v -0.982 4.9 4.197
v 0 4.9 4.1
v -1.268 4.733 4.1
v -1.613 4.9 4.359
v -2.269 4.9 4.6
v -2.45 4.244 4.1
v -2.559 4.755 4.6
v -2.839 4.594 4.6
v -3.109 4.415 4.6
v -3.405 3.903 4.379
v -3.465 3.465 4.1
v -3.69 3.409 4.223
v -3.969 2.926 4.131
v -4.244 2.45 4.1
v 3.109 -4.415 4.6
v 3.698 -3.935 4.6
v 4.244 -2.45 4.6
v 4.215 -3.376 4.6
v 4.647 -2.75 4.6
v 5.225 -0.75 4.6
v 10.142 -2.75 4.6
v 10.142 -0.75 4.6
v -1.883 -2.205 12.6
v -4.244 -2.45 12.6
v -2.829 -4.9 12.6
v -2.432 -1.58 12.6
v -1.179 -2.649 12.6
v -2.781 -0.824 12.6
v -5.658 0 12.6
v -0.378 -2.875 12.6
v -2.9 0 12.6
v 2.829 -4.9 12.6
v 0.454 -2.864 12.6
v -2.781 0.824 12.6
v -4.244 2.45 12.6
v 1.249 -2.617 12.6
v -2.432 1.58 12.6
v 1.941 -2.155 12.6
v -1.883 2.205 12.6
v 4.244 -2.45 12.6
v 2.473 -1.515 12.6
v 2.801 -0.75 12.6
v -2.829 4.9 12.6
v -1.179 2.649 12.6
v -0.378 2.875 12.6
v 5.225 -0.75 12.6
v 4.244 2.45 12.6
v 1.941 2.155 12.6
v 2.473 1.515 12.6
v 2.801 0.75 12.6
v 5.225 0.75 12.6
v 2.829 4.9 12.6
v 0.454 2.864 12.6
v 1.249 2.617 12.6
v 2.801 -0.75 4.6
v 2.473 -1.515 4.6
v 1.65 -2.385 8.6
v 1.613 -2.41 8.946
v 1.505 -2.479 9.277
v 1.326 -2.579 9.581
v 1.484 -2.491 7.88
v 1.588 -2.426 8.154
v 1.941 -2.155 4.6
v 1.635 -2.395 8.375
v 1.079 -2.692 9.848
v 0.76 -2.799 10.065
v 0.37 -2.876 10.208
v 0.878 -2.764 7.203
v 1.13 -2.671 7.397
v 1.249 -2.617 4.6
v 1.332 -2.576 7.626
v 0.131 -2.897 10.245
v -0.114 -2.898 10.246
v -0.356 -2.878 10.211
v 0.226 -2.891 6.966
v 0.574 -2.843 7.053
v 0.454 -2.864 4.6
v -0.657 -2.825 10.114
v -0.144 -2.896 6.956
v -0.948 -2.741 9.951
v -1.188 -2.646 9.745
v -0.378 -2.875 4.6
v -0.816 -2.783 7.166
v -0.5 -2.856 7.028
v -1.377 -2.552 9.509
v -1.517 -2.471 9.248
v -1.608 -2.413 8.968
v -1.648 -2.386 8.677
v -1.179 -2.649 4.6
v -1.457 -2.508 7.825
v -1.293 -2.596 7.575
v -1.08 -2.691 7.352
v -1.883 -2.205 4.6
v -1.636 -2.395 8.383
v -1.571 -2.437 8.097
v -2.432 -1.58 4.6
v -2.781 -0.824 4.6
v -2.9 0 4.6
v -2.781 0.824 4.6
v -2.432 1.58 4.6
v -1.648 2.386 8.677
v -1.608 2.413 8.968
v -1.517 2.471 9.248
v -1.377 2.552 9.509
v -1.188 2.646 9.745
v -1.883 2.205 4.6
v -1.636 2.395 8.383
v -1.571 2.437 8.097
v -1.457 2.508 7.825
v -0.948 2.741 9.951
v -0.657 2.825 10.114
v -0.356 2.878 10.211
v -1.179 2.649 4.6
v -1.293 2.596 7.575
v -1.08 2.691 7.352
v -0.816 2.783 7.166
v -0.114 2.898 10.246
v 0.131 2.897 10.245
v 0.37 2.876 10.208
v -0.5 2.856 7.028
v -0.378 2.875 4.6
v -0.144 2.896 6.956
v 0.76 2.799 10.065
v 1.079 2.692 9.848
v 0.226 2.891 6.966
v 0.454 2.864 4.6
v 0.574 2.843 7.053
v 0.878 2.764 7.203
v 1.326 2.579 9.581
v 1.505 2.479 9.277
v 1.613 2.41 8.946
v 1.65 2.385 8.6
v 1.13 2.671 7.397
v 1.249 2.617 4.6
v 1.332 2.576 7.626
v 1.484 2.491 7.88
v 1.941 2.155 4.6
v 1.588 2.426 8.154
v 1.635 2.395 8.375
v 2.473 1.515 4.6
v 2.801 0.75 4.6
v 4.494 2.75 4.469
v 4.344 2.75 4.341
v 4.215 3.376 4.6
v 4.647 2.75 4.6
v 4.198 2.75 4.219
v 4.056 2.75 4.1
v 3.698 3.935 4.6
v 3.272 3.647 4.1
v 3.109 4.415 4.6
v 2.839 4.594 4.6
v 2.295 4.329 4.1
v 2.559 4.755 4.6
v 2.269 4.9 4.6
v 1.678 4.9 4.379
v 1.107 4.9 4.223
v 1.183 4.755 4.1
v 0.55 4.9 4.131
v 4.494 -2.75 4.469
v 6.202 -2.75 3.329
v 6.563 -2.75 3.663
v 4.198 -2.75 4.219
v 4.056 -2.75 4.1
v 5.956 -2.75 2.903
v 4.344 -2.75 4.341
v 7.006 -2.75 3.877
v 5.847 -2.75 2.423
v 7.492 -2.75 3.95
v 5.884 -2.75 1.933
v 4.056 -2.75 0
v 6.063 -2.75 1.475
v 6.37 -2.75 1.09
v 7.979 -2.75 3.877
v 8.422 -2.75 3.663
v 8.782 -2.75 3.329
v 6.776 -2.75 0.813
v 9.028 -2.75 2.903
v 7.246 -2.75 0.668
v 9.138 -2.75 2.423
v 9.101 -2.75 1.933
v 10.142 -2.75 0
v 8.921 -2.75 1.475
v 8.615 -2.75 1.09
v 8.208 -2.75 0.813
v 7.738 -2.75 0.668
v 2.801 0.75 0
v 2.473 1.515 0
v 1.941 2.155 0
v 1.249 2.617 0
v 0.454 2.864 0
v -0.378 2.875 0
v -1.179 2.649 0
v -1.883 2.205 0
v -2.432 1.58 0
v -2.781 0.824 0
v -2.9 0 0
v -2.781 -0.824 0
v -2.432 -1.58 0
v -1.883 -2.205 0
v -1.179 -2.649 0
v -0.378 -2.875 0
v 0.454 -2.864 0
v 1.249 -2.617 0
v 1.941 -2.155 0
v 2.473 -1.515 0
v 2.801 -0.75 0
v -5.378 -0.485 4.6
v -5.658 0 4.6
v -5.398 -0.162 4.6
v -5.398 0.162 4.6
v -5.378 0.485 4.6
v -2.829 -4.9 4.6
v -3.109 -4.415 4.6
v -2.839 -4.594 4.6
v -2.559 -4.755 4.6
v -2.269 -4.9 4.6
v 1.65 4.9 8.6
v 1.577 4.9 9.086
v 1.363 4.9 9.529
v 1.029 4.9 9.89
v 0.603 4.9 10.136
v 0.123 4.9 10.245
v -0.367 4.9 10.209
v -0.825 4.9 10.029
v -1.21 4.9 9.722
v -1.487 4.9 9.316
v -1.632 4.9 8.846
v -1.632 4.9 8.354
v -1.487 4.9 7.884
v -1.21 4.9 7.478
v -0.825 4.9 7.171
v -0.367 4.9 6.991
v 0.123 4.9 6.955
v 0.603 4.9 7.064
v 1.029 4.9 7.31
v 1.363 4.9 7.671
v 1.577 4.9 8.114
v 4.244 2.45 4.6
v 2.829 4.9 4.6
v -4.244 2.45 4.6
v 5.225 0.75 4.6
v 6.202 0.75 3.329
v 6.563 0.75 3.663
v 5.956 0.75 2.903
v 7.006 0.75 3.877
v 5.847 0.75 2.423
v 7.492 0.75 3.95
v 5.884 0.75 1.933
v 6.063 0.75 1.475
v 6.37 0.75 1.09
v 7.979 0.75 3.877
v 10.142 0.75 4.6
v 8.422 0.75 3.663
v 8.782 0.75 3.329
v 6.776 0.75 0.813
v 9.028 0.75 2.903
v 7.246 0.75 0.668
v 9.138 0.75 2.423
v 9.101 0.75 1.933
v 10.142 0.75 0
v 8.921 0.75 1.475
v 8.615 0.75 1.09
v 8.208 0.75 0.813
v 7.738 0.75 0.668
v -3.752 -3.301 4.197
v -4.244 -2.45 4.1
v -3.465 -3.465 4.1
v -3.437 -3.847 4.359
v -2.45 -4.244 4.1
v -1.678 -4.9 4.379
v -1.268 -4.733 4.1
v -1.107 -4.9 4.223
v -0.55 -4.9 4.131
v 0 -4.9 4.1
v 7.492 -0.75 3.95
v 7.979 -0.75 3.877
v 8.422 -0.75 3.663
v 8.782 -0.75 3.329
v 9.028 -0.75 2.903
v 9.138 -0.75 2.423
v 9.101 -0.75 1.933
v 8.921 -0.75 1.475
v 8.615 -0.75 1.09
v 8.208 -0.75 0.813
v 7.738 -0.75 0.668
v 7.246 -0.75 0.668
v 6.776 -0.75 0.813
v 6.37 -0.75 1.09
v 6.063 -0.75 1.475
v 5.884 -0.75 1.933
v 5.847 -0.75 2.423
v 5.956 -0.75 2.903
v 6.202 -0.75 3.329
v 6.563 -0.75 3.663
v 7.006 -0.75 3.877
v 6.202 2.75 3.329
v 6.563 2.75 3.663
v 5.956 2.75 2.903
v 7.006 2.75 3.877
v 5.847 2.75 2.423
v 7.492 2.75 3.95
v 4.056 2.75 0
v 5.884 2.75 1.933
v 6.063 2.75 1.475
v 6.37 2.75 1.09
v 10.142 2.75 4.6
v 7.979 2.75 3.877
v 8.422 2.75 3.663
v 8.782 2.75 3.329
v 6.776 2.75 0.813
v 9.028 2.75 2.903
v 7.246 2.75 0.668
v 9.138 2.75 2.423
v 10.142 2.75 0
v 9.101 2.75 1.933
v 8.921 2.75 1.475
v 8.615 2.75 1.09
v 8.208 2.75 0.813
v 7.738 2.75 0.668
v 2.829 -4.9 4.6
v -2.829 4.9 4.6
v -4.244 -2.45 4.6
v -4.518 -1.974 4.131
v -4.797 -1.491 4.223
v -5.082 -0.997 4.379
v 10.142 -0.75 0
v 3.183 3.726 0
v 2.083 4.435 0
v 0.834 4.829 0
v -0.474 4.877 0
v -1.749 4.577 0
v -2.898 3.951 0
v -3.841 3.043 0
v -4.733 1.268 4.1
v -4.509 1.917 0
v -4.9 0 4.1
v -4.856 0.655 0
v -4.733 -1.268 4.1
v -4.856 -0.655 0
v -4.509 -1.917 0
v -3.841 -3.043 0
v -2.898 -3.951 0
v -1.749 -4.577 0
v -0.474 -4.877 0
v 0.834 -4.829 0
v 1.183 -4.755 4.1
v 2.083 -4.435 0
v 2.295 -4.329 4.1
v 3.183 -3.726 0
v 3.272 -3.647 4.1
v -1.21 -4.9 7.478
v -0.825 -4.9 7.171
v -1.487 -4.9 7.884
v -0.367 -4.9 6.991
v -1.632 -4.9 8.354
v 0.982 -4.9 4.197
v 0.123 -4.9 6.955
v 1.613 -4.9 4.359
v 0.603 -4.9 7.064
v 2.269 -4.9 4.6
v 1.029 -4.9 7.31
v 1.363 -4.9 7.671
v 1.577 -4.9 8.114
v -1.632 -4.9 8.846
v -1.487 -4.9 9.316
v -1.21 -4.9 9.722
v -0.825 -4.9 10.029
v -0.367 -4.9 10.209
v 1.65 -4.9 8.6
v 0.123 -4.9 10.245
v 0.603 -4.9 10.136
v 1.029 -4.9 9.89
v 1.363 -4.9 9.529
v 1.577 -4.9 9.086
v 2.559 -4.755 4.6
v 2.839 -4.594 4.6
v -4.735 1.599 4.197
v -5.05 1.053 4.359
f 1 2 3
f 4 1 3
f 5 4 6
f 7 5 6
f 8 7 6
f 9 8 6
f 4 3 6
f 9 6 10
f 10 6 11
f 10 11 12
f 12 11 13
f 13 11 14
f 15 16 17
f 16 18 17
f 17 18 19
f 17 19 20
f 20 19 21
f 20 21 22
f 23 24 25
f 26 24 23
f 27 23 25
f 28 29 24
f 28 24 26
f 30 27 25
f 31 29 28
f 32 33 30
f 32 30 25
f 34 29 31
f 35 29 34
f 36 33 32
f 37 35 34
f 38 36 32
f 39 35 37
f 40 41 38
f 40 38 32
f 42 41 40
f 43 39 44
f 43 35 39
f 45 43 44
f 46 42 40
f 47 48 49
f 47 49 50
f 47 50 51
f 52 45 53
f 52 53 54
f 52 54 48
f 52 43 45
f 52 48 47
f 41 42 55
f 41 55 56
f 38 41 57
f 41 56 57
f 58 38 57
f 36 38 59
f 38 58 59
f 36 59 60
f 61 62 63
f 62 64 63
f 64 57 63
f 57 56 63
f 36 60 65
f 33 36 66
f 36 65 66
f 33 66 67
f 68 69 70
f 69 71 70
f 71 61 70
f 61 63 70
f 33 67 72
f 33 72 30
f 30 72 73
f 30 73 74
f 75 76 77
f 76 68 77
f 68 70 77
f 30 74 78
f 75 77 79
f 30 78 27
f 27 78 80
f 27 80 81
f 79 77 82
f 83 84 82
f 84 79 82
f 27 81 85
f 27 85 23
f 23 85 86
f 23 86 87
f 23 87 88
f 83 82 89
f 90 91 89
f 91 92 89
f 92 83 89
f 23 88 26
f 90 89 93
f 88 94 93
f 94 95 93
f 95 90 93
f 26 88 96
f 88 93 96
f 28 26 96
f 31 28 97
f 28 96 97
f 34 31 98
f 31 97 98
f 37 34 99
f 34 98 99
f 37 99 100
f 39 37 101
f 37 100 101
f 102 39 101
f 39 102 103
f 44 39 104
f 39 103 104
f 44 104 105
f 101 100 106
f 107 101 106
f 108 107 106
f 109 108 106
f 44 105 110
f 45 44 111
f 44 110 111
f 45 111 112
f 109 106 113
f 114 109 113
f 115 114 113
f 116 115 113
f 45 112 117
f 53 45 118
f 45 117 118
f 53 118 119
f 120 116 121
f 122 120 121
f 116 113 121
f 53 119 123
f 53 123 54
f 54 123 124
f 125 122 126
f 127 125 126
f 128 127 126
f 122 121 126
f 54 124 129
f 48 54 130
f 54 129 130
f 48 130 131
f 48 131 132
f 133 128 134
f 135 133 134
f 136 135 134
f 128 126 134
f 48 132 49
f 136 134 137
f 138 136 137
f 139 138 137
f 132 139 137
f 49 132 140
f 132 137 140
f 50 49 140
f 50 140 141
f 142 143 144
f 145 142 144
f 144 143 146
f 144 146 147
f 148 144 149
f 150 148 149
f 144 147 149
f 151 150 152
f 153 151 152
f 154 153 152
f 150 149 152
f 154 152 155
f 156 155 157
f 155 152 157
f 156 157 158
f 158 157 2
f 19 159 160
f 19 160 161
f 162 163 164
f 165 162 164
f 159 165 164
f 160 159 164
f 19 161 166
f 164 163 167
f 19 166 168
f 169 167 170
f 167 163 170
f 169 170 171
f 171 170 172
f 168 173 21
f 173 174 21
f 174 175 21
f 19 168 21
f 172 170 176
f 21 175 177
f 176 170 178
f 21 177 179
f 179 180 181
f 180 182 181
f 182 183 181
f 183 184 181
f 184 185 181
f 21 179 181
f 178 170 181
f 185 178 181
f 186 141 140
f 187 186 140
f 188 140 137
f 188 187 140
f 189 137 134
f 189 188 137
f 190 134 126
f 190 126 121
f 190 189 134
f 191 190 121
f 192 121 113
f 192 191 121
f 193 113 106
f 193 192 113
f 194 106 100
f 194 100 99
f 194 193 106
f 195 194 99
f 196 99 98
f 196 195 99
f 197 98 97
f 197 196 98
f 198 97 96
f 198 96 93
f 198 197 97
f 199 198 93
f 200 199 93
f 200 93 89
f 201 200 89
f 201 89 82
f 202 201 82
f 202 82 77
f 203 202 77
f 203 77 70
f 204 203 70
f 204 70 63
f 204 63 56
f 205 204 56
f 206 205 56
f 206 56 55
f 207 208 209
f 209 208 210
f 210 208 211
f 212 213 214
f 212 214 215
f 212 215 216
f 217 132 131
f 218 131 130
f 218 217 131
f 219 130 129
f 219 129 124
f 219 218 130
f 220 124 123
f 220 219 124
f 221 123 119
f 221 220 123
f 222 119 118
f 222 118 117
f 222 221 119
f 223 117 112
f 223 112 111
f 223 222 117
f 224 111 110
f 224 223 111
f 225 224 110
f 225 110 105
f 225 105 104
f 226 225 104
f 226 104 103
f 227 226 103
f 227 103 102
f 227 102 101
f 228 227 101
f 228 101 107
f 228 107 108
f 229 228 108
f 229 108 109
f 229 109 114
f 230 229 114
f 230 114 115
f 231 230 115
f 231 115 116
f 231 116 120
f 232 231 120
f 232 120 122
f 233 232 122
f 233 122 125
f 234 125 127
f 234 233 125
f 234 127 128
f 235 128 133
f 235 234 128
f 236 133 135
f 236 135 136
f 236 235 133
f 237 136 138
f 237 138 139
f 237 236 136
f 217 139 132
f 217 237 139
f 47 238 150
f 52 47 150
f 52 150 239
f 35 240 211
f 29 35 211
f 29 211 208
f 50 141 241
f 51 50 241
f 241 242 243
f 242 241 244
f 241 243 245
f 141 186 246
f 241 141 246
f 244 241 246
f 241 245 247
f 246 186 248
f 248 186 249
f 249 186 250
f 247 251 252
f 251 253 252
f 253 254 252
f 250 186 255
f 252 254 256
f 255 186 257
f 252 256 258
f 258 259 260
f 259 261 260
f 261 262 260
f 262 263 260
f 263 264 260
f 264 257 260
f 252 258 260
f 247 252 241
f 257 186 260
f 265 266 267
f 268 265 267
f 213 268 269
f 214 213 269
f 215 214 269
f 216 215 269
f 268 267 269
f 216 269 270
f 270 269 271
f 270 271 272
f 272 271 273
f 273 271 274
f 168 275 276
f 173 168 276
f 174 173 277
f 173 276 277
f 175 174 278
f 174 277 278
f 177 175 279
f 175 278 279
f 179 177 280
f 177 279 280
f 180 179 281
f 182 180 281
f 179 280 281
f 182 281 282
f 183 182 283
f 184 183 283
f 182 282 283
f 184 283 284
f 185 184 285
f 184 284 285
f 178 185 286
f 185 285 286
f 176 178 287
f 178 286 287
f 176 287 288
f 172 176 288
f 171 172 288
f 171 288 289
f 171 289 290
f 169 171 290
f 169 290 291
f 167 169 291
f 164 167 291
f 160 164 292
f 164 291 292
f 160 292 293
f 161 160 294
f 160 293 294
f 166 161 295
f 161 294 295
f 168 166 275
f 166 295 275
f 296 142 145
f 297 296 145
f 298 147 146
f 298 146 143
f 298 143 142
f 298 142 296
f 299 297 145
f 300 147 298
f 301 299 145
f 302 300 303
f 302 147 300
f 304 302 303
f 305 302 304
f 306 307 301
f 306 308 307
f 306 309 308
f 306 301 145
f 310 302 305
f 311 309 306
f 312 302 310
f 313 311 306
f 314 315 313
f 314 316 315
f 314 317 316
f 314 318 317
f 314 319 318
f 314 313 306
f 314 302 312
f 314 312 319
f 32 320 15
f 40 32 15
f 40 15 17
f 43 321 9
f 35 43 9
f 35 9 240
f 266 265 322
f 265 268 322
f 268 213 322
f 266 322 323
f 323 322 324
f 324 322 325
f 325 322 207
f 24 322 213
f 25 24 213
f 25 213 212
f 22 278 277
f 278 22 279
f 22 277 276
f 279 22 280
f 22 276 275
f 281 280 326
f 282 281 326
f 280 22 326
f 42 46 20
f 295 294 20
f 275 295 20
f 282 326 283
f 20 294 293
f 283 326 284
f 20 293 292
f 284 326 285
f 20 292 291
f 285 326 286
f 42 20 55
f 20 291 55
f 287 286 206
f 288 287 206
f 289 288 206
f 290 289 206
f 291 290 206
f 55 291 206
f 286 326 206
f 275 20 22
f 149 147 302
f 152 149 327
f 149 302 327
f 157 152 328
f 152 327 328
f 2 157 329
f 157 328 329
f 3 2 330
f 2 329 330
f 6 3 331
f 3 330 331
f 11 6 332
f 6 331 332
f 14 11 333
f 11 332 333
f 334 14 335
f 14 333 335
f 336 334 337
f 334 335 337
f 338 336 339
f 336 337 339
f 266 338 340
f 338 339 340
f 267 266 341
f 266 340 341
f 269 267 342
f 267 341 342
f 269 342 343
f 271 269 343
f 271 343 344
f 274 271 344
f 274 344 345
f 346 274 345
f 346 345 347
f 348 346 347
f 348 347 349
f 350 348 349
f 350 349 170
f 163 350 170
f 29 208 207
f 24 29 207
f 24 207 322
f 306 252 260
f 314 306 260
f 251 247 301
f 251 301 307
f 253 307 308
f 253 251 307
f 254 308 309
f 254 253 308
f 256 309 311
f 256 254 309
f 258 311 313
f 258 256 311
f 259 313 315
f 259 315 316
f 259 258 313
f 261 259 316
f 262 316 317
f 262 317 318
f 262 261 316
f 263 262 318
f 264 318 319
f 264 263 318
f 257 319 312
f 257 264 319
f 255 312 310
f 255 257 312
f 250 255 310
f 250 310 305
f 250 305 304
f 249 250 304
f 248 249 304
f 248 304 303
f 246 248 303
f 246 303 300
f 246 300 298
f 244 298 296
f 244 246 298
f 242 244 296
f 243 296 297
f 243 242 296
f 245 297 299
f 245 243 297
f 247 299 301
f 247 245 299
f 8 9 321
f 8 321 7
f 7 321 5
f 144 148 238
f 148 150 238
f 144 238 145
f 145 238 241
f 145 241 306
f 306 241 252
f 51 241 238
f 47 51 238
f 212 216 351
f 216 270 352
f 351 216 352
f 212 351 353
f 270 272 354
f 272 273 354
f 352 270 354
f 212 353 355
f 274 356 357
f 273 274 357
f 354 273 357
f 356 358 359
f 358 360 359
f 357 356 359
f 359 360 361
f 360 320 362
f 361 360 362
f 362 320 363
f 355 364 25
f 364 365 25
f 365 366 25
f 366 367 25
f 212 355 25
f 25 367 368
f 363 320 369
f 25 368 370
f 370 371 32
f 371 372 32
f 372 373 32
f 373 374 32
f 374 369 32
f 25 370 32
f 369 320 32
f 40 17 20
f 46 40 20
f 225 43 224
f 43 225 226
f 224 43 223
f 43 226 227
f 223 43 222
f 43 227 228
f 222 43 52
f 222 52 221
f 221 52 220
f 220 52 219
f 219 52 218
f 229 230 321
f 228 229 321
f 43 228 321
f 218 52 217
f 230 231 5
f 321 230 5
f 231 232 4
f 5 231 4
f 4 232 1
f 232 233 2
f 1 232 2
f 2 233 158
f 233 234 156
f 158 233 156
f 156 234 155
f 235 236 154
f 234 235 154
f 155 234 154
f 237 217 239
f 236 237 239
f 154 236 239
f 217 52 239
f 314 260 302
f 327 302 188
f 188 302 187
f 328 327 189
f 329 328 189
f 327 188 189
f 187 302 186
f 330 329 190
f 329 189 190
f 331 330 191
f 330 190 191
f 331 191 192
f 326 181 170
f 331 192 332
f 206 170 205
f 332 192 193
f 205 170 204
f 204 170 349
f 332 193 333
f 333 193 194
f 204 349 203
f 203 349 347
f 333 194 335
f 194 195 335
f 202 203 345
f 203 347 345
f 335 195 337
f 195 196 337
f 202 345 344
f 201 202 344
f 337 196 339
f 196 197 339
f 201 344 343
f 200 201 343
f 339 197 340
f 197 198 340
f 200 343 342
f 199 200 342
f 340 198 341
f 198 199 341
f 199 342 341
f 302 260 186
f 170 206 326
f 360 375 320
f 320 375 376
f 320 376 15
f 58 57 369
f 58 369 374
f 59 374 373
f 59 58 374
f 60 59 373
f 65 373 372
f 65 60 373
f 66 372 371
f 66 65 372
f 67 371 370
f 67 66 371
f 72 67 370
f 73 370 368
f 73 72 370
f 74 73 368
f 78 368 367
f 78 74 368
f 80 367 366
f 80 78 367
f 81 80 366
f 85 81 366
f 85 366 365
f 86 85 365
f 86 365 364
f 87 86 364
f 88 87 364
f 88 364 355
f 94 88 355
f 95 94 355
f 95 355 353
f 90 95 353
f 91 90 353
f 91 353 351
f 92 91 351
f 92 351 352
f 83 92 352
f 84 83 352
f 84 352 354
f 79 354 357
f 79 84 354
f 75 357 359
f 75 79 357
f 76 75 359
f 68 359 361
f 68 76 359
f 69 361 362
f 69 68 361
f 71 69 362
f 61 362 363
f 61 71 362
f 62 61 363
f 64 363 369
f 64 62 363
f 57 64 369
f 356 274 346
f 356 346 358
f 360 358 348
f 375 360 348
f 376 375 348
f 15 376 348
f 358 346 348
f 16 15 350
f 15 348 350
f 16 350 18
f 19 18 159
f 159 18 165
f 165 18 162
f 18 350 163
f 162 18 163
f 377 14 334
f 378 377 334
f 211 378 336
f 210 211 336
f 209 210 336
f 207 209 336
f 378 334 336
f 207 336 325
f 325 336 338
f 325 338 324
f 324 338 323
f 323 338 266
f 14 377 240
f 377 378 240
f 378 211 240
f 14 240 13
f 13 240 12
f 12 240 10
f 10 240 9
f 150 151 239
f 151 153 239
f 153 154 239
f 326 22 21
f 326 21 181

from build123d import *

# Parameters (mm, degrees)
CROQUIS1_R                 = 4.9
CROQUIS1_R_2               = 2.9
SALIENTE_EXTRUIR1_DEPTH    = 4.6
CORTAR_EXTRUIR2_DEPTH      = 0.75
CORTAR_EXTRUIR2_DEPTH_BACK = 0.75
CROQUIS2_W                 = 2.8
CROQUIS2_H                 = 4.6
CROQUIS4_R                 = 1.65
SALIENTE_EXTRUIR2_DEPTH    = 2
SALIENTE_EXTRUIR3_DEPTH    = 8
CORTAR_EXTRUIR3_DEPTH      = 19.912045786
CORTAR_EXTRUIR3_DEPTH_BACK = 19.912045786
CROQUIS6_R                 = 1.65
CHAFL_N1_SIZE              = 0.5


with BuildPart() as part:
    # Croquis1 → Saliente-Extruir1 (new body)
    with BuildSketch(Plane.XY):
        Circle(CROQUIS1_R)
        Circle(CROQUIS1_R_2, mode=Mode.SUBTRACT)
    extrude(amount=SALIENTE_EXTRUIR1_DEPTH)

    # Croquis2 → Cortar-Extruir2 (cut, two sides: drawn at the far end of the back side and taken through both)
    with BuildSketch(Plane(origin=(0, 0, 0), x_dir=(1, 0, 0), z_dir=(0, 1, 0)).offset(-CORTAR_EXTRUIR2_DEPTH_BACK)):
        with Locations((3.6, -2.3)):
            Rectangle(CROQUIS2_W, CROQUIS2_H)
    extrude(amount=CORTAR_EXTRUIR2_DEPTH + CORTAR_EXTRUIR2_DEPTH_BACK, mode=Mode.SUBTRACT)



with BuildPart() as body_2:
    # Croquis4 → Saliente-Extruir2 (new body)
    with BuildSketch(Plane(origin=(0, -0.75, 0), x_dir=(1, 0, 0), z_dir=(0, 1, 0))):
        Polygon((4.842261868, -4.6), (10.142261868, -4.6), (10.142261868, 0), (4.842261868, 0), (2.801338966, 0), (2.801338966, -4.6), align=None)
        with Locations(Location((7.492261868, -2.3, 0), (0, 0, 270))):
            Circle(CROQUIS4_R, mode=Mode.SUBTRACT)
    extrude(amount=-SALIENTE_EXTRUIR2_DEPTH)


with BuildPart() as body_3:
    # Simetría3: mirrored copy
    add(body_2.part.mirror(Plane.ZX))


with BuildPart() as part_1:
    add(part.part)

    add(body_2.part)  # Saliente-Extruir3 merges body 2

    add(body_3.part)  # Saliente-Extruir3 merges body 3
    # Croquis5 → Saliente-Extruir3 (add)
    with BuildSketch(Plane.XY.offset(4.6)):
        with BuildLine():
            ThreePointArc((2.801338966, -0.75), (-2.9, 0), (2.801338966, 0.75))
            Line((2.801338966, 0.75), (4.842261868, 0.75))
            ThreePointArc((4.842261868, 0.75), (-4.9, 0), (4.842261868, -0.75))
            Line((4.842261868, -0.75), (2.801338966, -0.75))
        make_face()
        with BuildLine():
            Line((-2.829016319, 4.9), (-4.243524531, 2.449999908))
            ThreePointArc((-4.243524531, 2.449999908), (-2.450000051, 4.243524449), (-1.2e-08, 4.9))
            Line((-1.2e-08, 4.9), (-2.829016319, 4.9))
        make_face()
        with BuildLine():
            Line((-5.658032638, 0), (-4.243524553, -2.449999871))
            ThreePointArc((-4.243524553, -2.449999871), (-4.9, 2.1e-08), (-4.243524531, 2.449999908))
            Line((-4.243524531, 2.449999908), (-5.658032638, 0))
        make_face()
        with BuildLine():
            Line((-2.829016319, -4.9), (-1.5e-08, -4.9))
            ThreePointArc((-1.5e-08, -4.9), (-2.450000071, -4.243524438), (-4.243524553, -2.449999871))
            Line((-4.243524553, -2.449999871), (-2.829016319, -4.9))
        make_face()
        with BuildLine():
            Line((-1.5e-08, -4.9), (2.829016319, -4.9))
            Line((2.829016319, -4.9), (4.24352445, -2.45000005))
            ThreePointArc((4.24352445, -2.45000005), (2.449999969, -4.243524497), (-1.5e-08, -4.9))
        make_face()
        with BuildLine():
            Line((2.829016319, 4.9), (-1.2e-08, 4.9))
            ThreePointArc((-1.2e-08, 4.9), (2.450000039, 4.243524456), (4.243524529, 2.449999913))
            Line((4.243524529, 2.449999913), (2.829016319, 4.9))
        make_face()
        with BuildLine():
            Line((4.842261868, 0.75), (5.225019936, 0.75))
            Line((5.225019936, 0.75), (4.243524529, 2.449999913))
            ThreePointArc((4.243524529, 2.449999913), (4.621728956, 1.627765788), (4.842261868, 0.75))
        make_face()
        with BuildLine():
            ThreePointArc((4.842261868, -0.75), (4.621728929, -1.627765863), (4.24352445, -2.45000005))
            Line((4.24352445, -2.45000005), (5.225019936, -0.75))
            Line((5.225019936, -0.75), (4.842261868, -0.75))
        make_face()
    extrude(amount=SALIENTE_EXTRUIR3_DEPTH)

    # Croquis6 → Cortar-Extruir3 (cut, two sides: drawn at the far end of the back side and taken through both)
    with BuildSketch(Plane.XZ.offset(4.9).offset(-CORTAR_EXTRUIR3_DEPTH_BACK)):
        with Locations((0, 8.6)):
            Circle(CROQUIS6_R)
    extrude(amount=CORTAR_EXTRUIR3_DEPTH + CORTAR_EXTRUIR3_DEPTH_BACK, mode=Mode.SUBTRACT)

    # Chaflán1
    # the kernel refuses this chamfer: 0.5 mm, written as the material it adds along each edge
    with BuildSketch(Plane(origin=(0, 0, 4.6), x_dir=(0, 1, 0), z_dir=(1, 0, 0))) as chafl_n1_piece_1_section:
        Polygon((4.9 + CHAFL_N1_SIZE, 0), (4.9, -CHAFL_N1_SIZE), (4.9, 0), align=None)
    chafl_n1_piece_1 = revolve(axis=Axis((0, 0, 4.6), (0, 0, 1)), revolution_arc=59.999998828, mode=Mode.PRIVATE)
    chafl_n1_piece_1 = split(chafl_n1_piece_1, bisect_by=Plane(origin=(-2.470137352, 4.9, 4.415231156), z_dir=(0, -1, 0)), keep=Keep.TOP, mode=Mode.PRIVATE)
    chafl_n1_piece_1 = split(chafl_n1_piece_1, bisect_by=Plane(origin=(-3.008455802, 4.589201698, 4.415231156), z_dir=(0.8660254037844386, -0.5000000000000002, 0)), keep=Keep.TOP, mode=Mode.PRIVATE)
    add(chafl_n1_piece_1)
    with BuildSketch(Plane(origin=(0, 0, 4.6), x_dir=(-0.8660253935532619, 0.5000000177209175, 0), z_dir=(0.5000000177209175, 0.8660253935532619, 0))) as chafl_n1_piece_2_section:
        Polygon((4.9 + CHAFL_N1_SIZE, 0), (4.9, -CHAFL_N1_SIZE), (4.9, 0), align=None)
    chafl_n1_piece_2 = revolve(axis=Axis((0, 0, 4.6), (0, 0, 1)), revolution_arc=59.99999929, mode=Mode.PRIVATE)
    chafl_n1_piece_2 = split(chafl_n1_piece_2, bisect_by=Plane(origin=(-5.478593155, 0.310798302, 4.415231156), z_dir=(0.8660254037844386, -0.5000000000000002, 0)), keep=Keep.TOP, mode=Mode.PRIVATE)
    chafl_n1_piece_2 = split(chafl_n1_piece_2, bisect_by=Plane(origin=(-5.478593155, -0.310798302, 4.415231156), z_dir=(0.8660254037844386, 0.5000000000000002, 0)), keep=Keep.TOP, mode=Mode.PRIVATE)
    add(chafl_n1_piece_2)
    with BuildSketch(Plane(origin=(0, 0, 4.6), x_dir=(-0.8660254202095417, -0.4999999715508861, 0), z_dir=(-0.4999999715508861, 0.8660254202095417, 0))) as chafl_n1_piece_3_section:
        Polygon((4.9 + CHAFL_N1_SIZE, 0), (4.9, -CHAFL_N1_SIZE), (4.9, 0), align=None)
    chafl_n1_piece_3 = revolve(axis=Axis((0, 0, 4.6), (0, 0, 1)), revolution_arc=60.000001882, mode=Mode.PRIVATE)
    chafl_n1_piece_3 = split(chafl_n1_piece_3, bisect_by=Plane(origin=(-3.008455802, -4.589201698, 4.415231156), z_dir=(0.8660254037844386, 0.5000000000000002, 0)), keep=Keep.TOP, mode=Mode.PRIVATE)
    chafl_n1_piece_3 = split(chafl_n1_piece_3, bisect_by=Plane(origin=(-2.470137352, -4.9, 4.415231156), z_dir=(0, 1, 0)), keep=Keep.TOP, mode=Mode.PRIVATE)
    add(chafl_n1_piece_3)
    with BuildSketch(Plane(origin=(0, 0, 4.6), x_dir=(0, -1, 0), z_dir=(-1, 0, 0))) as chafl_n1_piece_4_section:
        Polygon((4.9 + CHAFL_N1_SIZE, 0), (4.9, -CHAFL_N1_SIZE), (4.9, 0), align=None)
    chafl_n1_piece_4 = revolve(axis=Axis((0, 0, 4.6), (0, 0, 1)), revolution_arc=70.897169979, mode=Mode.PRIVATE)
    chafl_n1_piece_4 = split(chafl_n1_piece_4, bisect_by=Plane(origin=(2.466837368, -4.9, 4.415358811), z_dir=(0, 1, 0)), keep=Keep.TOP, mode=Mode.PRIVATE)
    add(chafl_n1_piece_4)
    with BuildSketch(Plane(origin=(0, 0, 4.6), x_dir=(0.9449327486717788, 0.3272645726130418, 0), z_dir=(0.3272645726130418, -0.9449327486717788, 0))) as chafl_n1_piece_5_section:
        Polygon((4.9 + CHAFL_N1_SIZE, 0), (4.9, -CHAFL_N1_SIZE), (4.9, 0), align=None)
    chafl_n1_piece_5 = revolve(axis=Axis((0, 0, 4.6), (0, 0, 1)), revolution_arc=70.897169979, mode=Mode.PRIVATE)
    chafl_n1_piece_5 = split(chafl_n1_piece_5, bisect_by=Plane(origin=(3.940959453, 4.9, 4.468069459), z_dir=(0, -1, 0)), keep=Keep.TOP, mode=Mode.PRIVATE)
    add(chafl_n1_piece_5)


solid = part_1.part
